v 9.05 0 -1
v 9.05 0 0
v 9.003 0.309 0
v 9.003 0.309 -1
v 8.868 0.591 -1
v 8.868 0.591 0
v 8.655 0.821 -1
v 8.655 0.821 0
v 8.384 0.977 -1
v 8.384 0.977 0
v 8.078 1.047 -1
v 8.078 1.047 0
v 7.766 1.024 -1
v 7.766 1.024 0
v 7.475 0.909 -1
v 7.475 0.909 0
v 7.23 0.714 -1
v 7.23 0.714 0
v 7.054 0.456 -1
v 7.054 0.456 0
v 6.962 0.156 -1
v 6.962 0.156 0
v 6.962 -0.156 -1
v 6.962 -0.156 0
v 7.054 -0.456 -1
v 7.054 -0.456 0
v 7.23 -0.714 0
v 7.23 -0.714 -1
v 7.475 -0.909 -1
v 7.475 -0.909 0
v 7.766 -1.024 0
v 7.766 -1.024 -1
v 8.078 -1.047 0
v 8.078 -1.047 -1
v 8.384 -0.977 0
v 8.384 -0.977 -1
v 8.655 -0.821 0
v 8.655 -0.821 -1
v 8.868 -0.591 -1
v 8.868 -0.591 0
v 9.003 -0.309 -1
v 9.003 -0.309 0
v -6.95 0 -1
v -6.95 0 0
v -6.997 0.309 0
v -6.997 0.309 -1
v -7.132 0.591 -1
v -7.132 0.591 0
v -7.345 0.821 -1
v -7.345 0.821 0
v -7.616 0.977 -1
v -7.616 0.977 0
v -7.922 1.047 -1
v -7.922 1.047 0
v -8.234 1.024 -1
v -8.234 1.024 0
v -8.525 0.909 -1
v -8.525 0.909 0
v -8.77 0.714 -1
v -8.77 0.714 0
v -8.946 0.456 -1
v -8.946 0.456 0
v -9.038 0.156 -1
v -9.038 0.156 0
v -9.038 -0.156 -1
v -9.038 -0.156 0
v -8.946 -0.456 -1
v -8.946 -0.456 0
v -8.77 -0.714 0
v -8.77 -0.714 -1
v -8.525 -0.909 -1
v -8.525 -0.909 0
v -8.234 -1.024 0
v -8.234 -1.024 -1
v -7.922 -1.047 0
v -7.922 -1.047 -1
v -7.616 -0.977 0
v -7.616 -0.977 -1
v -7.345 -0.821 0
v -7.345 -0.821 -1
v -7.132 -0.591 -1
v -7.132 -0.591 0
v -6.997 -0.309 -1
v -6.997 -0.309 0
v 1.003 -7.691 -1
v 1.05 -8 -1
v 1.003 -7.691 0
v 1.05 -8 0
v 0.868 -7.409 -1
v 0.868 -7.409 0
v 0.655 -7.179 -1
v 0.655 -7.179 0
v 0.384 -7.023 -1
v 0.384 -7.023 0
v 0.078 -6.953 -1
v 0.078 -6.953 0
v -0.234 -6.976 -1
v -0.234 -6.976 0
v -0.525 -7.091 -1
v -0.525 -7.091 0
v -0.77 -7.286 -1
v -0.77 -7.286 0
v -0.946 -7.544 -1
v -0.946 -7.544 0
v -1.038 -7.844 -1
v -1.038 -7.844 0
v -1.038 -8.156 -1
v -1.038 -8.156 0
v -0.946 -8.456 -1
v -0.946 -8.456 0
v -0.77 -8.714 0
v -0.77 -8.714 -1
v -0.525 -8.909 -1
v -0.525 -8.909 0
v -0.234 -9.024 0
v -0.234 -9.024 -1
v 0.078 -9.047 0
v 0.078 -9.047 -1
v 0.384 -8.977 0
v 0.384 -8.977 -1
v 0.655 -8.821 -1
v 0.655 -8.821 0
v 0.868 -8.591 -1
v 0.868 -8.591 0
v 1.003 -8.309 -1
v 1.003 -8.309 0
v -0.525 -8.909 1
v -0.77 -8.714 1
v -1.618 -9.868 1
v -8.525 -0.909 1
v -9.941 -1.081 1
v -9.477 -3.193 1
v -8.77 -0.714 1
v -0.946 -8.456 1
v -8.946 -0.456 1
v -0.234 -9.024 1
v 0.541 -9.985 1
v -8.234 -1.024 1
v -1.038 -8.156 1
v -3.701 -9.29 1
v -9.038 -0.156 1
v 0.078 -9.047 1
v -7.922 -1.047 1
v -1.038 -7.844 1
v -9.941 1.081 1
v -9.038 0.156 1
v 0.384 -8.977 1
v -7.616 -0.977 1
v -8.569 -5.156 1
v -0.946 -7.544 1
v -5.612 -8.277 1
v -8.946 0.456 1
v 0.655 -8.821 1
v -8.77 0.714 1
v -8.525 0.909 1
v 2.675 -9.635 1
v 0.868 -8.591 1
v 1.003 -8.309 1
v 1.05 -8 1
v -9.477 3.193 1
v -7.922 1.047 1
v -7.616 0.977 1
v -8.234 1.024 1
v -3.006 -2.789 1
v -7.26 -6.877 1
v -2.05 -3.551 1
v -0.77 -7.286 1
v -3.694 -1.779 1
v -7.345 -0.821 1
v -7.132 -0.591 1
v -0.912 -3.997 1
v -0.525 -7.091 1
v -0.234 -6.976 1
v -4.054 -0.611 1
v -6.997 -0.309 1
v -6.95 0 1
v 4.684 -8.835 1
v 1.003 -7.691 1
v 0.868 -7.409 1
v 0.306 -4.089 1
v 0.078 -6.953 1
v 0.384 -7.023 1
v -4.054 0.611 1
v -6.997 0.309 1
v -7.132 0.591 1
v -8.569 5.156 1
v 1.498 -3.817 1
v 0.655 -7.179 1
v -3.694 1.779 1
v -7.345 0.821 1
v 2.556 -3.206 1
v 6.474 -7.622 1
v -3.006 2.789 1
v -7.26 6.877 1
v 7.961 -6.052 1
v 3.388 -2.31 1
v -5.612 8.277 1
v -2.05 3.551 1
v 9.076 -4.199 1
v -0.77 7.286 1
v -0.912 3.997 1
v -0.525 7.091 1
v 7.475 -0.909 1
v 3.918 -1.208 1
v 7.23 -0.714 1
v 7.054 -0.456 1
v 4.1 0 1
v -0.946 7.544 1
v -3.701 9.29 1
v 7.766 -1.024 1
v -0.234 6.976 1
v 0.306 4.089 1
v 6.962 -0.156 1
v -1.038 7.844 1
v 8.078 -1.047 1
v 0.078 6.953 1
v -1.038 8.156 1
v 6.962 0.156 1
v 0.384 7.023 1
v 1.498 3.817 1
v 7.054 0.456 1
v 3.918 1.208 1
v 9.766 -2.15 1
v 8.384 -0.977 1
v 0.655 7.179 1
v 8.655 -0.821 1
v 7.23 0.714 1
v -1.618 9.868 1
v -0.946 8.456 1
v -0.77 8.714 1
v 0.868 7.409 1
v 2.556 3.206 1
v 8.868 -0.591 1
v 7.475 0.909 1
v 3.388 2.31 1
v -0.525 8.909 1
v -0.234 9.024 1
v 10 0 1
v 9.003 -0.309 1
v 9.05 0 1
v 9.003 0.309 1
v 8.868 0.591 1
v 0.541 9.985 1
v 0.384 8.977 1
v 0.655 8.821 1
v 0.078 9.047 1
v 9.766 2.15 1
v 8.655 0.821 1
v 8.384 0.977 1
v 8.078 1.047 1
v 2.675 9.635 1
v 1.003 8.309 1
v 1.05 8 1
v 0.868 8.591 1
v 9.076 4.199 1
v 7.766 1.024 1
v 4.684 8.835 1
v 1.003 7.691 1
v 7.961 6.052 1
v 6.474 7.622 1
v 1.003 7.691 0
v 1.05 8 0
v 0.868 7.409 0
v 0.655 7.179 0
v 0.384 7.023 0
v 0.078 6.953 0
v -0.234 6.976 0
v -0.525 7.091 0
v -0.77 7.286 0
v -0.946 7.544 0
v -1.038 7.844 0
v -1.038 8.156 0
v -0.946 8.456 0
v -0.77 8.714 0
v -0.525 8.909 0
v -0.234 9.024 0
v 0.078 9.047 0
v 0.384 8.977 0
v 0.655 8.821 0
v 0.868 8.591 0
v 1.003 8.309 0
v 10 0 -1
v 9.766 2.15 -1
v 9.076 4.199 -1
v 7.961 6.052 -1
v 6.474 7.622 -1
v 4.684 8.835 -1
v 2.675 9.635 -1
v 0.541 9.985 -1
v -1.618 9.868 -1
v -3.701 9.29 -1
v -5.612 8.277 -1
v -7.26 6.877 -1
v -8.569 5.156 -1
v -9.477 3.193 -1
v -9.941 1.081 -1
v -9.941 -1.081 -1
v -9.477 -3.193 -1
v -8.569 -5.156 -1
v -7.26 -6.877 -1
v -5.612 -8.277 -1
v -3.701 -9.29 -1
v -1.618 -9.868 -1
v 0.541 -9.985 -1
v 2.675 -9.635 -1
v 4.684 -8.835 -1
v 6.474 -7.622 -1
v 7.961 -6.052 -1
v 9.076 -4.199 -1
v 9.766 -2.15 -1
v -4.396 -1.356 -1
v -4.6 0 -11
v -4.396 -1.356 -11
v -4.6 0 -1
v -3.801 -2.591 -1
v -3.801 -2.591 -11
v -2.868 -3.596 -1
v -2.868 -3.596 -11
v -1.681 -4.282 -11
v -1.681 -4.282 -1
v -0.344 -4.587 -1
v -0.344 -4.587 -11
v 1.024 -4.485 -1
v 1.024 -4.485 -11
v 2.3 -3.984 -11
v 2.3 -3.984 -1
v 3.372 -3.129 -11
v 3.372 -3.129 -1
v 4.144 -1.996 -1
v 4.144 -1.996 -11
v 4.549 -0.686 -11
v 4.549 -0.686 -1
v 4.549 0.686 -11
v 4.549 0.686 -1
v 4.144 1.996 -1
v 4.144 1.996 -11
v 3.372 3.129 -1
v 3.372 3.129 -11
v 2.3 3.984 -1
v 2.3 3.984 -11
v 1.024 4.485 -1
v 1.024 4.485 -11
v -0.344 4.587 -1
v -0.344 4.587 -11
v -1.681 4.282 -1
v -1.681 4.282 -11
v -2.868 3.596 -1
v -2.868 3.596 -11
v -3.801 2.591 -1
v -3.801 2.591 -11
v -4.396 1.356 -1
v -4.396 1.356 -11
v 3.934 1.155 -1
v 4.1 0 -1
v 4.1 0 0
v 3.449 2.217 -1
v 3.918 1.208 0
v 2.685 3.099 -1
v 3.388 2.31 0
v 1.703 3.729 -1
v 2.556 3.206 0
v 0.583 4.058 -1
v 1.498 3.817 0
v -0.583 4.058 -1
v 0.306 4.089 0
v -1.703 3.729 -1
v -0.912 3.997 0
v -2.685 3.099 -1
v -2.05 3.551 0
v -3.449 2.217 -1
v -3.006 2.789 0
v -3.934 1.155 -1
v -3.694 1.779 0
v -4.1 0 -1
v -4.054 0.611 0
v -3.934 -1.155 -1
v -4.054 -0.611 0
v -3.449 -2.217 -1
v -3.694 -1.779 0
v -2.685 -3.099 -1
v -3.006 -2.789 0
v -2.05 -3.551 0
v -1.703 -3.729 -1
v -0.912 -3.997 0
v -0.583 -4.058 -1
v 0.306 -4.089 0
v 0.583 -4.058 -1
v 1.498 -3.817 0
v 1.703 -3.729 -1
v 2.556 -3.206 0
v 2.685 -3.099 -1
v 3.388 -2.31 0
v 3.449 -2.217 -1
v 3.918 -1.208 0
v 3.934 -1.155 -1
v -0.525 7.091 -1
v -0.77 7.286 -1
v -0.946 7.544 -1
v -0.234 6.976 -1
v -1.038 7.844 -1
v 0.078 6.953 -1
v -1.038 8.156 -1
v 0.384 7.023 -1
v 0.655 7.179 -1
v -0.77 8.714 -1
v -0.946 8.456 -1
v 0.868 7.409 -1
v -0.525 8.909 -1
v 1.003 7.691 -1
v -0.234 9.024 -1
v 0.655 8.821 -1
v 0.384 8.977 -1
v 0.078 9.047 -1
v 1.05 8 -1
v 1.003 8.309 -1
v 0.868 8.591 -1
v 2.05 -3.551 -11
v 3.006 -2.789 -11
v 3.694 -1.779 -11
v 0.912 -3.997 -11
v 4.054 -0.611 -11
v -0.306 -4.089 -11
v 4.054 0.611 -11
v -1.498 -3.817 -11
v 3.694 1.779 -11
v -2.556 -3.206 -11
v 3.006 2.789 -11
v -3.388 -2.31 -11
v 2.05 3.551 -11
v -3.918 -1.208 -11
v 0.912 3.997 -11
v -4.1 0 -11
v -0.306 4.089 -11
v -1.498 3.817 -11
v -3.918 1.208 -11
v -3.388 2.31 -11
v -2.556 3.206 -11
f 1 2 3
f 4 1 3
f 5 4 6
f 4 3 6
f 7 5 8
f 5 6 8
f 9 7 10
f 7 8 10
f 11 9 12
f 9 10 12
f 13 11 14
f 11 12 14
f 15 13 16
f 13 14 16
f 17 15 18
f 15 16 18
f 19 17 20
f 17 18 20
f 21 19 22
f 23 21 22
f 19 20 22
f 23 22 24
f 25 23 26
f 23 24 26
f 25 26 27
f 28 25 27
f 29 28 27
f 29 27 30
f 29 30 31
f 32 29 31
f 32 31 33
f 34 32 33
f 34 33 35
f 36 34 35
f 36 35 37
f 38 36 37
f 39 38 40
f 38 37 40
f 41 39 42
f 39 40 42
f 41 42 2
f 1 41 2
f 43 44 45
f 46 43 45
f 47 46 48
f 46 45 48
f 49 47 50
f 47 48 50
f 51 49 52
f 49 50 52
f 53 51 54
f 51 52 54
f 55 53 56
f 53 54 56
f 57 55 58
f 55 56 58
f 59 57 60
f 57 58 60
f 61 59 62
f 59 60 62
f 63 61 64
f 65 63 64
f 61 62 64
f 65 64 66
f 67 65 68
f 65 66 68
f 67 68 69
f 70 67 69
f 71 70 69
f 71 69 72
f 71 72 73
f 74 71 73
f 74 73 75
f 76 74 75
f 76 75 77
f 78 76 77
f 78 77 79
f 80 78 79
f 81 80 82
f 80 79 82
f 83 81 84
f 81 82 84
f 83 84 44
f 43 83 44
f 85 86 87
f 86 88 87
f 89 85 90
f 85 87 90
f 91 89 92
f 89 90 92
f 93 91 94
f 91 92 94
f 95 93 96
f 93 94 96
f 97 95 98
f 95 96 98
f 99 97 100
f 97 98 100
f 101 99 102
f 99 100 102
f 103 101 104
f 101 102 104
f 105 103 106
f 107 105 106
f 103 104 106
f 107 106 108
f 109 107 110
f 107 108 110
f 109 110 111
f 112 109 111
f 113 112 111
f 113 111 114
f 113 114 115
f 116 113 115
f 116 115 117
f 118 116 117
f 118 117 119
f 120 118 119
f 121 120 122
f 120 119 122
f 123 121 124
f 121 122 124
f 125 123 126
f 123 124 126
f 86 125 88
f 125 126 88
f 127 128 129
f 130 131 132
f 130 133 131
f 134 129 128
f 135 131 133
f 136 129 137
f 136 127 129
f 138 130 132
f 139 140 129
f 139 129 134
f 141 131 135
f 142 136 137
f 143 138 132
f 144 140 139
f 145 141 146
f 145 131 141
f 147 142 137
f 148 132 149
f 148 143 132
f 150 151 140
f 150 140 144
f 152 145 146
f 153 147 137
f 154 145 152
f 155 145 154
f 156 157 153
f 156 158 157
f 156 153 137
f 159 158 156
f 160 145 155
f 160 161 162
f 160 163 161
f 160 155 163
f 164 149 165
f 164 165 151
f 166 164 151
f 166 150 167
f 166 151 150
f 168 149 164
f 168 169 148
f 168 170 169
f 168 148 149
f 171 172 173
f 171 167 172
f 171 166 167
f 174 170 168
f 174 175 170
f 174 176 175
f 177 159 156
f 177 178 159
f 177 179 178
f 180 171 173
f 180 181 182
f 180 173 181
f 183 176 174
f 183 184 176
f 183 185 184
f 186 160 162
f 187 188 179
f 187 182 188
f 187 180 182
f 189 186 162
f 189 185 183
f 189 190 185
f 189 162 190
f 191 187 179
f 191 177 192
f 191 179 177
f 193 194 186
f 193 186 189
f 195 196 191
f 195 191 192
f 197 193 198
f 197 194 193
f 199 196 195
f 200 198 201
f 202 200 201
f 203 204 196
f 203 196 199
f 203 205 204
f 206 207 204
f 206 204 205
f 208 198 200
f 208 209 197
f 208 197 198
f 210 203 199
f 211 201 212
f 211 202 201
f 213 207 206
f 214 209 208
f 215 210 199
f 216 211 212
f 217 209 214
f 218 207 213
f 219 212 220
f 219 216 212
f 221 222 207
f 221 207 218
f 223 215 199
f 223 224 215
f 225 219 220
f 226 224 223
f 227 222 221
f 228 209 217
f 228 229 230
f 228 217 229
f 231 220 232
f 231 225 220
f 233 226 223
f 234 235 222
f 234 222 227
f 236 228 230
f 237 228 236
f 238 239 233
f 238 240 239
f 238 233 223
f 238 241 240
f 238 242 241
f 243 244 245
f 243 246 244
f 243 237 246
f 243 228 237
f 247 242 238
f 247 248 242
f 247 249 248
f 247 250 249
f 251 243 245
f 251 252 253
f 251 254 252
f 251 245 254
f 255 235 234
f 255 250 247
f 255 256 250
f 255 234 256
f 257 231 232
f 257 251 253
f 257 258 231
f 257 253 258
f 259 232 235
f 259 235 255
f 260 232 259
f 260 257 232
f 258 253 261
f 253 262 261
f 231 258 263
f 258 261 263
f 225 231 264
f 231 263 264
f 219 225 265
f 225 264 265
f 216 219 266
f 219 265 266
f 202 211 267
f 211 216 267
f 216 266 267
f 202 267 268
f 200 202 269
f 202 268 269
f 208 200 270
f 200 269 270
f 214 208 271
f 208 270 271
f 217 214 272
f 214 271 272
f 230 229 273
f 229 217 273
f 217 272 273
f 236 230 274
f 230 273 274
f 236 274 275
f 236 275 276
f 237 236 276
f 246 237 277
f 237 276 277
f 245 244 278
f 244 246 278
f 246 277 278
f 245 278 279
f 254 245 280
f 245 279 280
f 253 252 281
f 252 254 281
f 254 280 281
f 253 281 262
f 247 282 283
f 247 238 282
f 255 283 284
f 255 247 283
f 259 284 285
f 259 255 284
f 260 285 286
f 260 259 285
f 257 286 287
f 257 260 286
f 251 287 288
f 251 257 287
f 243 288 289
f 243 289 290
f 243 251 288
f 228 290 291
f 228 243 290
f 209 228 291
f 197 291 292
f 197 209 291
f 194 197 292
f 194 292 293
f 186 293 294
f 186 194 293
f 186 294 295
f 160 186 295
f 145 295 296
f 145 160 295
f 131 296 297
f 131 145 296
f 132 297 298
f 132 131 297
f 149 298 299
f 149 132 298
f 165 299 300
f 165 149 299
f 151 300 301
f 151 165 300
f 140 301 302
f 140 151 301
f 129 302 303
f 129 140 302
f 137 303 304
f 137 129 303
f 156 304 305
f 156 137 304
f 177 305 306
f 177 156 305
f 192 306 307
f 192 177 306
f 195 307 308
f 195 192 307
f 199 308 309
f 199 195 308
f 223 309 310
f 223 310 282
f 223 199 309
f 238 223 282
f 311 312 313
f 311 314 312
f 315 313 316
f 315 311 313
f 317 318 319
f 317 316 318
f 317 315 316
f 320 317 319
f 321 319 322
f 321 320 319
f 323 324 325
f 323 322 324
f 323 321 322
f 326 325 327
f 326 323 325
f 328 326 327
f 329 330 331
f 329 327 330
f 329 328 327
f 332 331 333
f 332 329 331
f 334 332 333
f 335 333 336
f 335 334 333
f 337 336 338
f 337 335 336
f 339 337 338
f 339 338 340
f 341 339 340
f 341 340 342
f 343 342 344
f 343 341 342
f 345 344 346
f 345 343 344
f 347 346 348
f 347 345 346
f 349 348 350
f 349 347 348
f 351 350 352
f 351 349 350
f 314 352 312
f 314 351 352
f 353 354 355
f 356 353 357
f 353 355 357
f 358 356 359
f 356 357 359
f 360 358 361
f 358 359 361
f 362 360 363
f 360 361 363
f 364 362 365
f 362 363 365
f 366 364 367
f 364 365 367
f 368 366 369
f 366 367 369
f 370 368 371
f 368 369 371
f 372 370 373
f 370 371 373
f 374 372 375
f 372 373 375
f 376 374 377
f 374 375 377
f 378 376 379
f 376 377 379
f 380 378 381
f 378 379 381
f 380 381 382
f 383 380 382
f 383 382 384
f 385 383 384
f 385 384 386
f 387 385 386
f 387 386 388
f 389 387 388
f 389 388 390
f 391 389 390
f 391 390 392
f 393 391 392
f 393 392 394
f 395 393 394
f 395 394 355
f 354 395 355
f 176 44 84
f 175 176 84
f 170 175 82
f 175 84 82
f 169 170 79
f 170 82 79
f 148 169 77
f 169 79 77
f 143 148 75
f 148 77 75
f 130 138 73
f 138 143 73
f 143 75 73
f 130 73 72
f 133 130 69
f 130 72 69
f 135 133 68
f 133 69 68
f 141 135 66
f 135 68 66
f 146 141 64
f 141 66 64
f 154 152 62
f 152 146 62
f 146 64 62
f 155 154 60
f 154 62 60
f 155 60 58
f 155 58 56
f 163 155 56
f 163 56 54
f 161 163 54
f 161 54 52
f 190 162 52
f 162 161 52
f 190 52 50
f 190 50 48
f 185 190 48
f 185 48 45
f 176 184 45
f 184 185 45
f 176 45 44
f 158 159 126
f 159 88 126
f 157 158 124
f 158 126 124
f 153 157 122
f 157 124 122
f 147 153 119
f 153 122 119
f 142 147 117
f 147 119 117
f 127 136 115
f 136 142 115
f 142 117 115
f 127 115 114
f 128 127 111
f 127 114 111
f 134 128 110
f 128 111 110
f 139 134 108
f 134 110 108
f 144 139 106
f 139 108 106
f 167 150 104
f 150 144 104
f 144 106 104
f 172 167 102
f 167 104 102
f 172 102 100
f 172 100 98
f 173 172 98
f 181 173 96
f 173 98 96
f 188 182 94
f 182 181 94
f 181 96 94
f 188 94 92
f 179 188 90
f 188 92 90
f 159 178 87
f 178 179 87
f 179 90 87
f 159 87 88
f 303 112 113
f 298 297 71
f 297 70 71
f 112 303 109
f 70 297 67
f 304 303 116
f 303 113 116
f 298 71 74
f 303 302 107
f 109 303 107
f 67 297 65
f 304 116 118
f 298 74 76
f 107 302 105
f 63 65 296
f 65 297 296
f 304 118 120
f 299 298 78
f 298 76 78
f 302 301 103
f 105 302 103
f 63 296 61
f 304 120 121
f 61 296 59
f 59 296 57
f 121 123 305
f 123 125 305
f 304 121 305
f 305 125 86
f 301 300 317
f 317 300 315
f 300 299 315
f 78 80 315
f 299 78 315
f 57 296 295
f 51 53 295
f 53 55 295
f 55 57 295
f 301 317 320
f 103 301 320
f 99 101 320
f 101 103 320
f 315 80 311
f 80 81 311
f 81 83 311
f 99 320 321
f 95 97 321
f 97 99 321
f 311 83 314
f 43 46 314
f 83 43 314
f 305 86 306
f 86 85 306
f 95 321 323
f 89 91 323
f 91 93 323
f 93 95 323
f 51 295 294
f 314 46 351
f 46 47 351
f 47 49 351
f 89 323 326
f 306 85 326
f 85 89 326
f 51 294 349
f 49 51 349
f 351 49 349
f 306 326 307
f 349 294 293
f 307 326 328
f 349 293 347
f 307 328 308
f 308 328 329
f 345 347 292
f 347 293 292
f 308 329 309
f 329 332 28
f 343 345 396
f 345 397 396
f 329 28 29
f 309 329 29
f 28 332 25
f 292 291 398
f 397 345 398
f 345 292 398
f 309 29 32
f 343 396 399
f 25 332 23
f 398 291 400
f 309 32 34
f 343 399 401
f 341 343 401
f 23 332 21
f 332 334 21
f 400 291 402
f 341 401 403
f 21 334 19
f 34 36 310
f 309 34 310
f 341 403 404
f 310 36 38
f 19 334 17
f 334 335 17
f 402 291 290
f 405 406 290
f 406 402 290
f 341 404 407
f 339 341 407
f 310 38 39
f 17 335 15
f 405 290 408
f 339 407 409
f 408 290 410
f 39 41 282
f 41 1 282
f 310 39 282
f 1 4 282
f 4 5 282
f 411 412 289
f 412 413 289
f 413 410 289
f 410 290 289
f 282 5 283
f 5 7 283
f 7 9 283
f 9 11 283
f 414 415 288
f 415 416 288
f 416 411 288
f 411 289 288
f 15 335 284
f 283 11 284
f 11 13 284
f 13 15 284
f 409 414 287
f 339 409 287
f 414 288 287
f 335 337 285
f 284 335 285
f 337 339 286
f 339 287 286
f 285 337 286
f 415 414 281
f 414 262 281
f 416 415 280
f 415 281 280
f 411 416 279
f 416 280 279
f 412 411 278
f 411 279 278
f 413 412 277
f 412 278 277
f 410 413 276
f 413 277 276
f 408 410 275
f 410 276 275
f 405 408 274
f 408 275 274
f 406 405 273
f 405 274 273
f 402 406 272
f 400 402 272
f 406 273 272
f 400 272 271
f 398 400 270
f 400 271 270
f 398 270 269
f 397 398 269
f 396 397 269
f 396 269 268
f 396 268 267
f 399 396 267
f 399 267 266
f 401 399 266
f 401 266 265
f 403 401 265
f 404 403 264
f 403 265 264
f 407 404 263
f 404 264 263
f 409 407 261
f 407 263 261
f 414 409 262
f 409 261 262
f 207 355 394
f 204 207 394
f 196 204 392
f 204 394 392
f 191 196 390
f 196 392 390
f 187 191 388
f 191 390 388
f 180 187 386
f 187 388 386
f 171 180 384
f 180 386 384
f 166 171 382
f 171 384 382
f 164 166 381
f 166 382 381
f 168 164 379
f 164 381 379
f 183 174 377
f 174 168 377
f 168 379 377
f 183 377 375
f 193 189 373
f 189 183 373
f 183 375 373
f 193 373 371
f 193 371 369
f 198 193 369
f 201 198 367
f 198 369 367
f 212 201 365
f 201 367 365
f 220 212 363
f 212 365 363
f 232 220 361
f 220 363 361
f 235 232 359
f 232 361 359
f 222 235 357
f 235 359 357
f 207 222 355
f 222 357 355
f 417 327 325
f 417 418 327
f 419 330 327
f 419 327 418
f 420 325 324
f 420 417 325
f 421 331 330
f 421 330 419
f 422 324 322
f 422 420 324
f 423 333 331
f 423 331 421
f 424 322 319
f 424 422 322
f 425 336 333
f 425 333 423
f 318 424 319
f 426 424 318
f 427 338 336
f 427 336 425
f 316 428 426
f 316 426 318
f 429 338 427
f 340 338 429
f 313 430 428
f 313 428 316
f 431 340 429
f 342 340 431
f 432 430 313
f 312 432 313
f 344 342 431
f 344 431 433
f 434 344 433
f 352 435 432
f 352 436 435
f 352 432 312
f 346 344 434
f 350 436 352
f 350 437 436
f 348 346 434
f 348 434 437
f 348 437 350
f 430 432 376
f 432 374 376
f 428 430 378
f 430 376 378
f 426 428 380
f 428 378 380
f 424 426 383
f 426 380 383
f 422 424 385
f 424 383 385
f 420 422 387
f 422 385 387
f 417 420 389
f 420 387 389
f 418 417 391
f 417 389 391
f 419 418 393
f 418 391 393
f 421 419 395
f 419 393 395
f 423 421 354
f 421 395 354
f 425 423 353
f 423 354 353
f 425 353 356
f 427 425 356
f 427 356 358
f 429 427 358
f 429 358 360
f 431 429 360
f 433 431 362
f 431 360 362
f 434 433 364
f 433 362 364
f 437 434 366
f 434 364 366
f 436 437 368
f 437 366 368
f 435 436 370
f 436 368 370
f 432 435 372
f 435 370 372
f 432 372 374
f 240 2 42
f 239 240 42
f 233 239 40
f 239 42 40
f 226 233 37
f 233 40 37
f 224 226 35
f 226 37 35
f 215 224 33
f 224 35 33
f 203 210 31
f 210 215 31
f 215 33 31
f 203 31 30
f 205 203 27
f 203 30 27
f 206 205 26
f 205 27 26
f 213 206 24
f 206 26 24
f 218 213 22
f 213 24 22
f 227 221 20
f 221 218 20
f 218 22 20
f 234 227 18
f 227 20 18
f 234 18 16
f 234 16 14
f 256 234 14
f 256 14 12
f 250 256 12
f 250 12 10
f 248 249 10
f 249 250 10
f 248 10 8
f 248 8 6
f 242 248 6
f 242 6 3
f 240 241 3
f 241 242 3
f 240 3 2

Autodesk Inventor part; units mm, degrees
sketch "Sketch1" plane through (0, 0, 0) normal (0, 0, 1) x (1, 0, 0)
  circle A0 centre (0, 0) radius 4.1
  circle A1 centre (0, 0) radius 10
  circle A2 centre (0, 8) radius 1.05
  circle A3 centre (-8, 0) radius 1.05
  circle A4 centre (0, -8) radius 1.05
  circle A5 centre (8, 0) radius 1.05
  dimension "d0" = 8.2
  dimension "d7" = 20
  dimension "d33" = 2.1
  dimension "d34" = 8
  dimension "d37" = 360
ref_plane "Work Plane5" through (0, 0, -1) normal (0, 0, -1) x (-1, 0, 0)
sketch "Sketch5" plane through (0, 0, -1) normal (0, 0, -1) x (-1, 0, 0)
  circle A0 centre (0, 0) radius 4.1 projected
  circle A1 centre (0, 0) radius 4.6
  dimension "d30" = 0.5
extrude "Extrusion8" add sketch "Sketch5" along normal blind 10
extrude "Extrusion9" add sketch "Sketch1" along normal mid plane 2
properties part number "porca_roscada_trapezoidal_001" material "Aluminum 6061"
